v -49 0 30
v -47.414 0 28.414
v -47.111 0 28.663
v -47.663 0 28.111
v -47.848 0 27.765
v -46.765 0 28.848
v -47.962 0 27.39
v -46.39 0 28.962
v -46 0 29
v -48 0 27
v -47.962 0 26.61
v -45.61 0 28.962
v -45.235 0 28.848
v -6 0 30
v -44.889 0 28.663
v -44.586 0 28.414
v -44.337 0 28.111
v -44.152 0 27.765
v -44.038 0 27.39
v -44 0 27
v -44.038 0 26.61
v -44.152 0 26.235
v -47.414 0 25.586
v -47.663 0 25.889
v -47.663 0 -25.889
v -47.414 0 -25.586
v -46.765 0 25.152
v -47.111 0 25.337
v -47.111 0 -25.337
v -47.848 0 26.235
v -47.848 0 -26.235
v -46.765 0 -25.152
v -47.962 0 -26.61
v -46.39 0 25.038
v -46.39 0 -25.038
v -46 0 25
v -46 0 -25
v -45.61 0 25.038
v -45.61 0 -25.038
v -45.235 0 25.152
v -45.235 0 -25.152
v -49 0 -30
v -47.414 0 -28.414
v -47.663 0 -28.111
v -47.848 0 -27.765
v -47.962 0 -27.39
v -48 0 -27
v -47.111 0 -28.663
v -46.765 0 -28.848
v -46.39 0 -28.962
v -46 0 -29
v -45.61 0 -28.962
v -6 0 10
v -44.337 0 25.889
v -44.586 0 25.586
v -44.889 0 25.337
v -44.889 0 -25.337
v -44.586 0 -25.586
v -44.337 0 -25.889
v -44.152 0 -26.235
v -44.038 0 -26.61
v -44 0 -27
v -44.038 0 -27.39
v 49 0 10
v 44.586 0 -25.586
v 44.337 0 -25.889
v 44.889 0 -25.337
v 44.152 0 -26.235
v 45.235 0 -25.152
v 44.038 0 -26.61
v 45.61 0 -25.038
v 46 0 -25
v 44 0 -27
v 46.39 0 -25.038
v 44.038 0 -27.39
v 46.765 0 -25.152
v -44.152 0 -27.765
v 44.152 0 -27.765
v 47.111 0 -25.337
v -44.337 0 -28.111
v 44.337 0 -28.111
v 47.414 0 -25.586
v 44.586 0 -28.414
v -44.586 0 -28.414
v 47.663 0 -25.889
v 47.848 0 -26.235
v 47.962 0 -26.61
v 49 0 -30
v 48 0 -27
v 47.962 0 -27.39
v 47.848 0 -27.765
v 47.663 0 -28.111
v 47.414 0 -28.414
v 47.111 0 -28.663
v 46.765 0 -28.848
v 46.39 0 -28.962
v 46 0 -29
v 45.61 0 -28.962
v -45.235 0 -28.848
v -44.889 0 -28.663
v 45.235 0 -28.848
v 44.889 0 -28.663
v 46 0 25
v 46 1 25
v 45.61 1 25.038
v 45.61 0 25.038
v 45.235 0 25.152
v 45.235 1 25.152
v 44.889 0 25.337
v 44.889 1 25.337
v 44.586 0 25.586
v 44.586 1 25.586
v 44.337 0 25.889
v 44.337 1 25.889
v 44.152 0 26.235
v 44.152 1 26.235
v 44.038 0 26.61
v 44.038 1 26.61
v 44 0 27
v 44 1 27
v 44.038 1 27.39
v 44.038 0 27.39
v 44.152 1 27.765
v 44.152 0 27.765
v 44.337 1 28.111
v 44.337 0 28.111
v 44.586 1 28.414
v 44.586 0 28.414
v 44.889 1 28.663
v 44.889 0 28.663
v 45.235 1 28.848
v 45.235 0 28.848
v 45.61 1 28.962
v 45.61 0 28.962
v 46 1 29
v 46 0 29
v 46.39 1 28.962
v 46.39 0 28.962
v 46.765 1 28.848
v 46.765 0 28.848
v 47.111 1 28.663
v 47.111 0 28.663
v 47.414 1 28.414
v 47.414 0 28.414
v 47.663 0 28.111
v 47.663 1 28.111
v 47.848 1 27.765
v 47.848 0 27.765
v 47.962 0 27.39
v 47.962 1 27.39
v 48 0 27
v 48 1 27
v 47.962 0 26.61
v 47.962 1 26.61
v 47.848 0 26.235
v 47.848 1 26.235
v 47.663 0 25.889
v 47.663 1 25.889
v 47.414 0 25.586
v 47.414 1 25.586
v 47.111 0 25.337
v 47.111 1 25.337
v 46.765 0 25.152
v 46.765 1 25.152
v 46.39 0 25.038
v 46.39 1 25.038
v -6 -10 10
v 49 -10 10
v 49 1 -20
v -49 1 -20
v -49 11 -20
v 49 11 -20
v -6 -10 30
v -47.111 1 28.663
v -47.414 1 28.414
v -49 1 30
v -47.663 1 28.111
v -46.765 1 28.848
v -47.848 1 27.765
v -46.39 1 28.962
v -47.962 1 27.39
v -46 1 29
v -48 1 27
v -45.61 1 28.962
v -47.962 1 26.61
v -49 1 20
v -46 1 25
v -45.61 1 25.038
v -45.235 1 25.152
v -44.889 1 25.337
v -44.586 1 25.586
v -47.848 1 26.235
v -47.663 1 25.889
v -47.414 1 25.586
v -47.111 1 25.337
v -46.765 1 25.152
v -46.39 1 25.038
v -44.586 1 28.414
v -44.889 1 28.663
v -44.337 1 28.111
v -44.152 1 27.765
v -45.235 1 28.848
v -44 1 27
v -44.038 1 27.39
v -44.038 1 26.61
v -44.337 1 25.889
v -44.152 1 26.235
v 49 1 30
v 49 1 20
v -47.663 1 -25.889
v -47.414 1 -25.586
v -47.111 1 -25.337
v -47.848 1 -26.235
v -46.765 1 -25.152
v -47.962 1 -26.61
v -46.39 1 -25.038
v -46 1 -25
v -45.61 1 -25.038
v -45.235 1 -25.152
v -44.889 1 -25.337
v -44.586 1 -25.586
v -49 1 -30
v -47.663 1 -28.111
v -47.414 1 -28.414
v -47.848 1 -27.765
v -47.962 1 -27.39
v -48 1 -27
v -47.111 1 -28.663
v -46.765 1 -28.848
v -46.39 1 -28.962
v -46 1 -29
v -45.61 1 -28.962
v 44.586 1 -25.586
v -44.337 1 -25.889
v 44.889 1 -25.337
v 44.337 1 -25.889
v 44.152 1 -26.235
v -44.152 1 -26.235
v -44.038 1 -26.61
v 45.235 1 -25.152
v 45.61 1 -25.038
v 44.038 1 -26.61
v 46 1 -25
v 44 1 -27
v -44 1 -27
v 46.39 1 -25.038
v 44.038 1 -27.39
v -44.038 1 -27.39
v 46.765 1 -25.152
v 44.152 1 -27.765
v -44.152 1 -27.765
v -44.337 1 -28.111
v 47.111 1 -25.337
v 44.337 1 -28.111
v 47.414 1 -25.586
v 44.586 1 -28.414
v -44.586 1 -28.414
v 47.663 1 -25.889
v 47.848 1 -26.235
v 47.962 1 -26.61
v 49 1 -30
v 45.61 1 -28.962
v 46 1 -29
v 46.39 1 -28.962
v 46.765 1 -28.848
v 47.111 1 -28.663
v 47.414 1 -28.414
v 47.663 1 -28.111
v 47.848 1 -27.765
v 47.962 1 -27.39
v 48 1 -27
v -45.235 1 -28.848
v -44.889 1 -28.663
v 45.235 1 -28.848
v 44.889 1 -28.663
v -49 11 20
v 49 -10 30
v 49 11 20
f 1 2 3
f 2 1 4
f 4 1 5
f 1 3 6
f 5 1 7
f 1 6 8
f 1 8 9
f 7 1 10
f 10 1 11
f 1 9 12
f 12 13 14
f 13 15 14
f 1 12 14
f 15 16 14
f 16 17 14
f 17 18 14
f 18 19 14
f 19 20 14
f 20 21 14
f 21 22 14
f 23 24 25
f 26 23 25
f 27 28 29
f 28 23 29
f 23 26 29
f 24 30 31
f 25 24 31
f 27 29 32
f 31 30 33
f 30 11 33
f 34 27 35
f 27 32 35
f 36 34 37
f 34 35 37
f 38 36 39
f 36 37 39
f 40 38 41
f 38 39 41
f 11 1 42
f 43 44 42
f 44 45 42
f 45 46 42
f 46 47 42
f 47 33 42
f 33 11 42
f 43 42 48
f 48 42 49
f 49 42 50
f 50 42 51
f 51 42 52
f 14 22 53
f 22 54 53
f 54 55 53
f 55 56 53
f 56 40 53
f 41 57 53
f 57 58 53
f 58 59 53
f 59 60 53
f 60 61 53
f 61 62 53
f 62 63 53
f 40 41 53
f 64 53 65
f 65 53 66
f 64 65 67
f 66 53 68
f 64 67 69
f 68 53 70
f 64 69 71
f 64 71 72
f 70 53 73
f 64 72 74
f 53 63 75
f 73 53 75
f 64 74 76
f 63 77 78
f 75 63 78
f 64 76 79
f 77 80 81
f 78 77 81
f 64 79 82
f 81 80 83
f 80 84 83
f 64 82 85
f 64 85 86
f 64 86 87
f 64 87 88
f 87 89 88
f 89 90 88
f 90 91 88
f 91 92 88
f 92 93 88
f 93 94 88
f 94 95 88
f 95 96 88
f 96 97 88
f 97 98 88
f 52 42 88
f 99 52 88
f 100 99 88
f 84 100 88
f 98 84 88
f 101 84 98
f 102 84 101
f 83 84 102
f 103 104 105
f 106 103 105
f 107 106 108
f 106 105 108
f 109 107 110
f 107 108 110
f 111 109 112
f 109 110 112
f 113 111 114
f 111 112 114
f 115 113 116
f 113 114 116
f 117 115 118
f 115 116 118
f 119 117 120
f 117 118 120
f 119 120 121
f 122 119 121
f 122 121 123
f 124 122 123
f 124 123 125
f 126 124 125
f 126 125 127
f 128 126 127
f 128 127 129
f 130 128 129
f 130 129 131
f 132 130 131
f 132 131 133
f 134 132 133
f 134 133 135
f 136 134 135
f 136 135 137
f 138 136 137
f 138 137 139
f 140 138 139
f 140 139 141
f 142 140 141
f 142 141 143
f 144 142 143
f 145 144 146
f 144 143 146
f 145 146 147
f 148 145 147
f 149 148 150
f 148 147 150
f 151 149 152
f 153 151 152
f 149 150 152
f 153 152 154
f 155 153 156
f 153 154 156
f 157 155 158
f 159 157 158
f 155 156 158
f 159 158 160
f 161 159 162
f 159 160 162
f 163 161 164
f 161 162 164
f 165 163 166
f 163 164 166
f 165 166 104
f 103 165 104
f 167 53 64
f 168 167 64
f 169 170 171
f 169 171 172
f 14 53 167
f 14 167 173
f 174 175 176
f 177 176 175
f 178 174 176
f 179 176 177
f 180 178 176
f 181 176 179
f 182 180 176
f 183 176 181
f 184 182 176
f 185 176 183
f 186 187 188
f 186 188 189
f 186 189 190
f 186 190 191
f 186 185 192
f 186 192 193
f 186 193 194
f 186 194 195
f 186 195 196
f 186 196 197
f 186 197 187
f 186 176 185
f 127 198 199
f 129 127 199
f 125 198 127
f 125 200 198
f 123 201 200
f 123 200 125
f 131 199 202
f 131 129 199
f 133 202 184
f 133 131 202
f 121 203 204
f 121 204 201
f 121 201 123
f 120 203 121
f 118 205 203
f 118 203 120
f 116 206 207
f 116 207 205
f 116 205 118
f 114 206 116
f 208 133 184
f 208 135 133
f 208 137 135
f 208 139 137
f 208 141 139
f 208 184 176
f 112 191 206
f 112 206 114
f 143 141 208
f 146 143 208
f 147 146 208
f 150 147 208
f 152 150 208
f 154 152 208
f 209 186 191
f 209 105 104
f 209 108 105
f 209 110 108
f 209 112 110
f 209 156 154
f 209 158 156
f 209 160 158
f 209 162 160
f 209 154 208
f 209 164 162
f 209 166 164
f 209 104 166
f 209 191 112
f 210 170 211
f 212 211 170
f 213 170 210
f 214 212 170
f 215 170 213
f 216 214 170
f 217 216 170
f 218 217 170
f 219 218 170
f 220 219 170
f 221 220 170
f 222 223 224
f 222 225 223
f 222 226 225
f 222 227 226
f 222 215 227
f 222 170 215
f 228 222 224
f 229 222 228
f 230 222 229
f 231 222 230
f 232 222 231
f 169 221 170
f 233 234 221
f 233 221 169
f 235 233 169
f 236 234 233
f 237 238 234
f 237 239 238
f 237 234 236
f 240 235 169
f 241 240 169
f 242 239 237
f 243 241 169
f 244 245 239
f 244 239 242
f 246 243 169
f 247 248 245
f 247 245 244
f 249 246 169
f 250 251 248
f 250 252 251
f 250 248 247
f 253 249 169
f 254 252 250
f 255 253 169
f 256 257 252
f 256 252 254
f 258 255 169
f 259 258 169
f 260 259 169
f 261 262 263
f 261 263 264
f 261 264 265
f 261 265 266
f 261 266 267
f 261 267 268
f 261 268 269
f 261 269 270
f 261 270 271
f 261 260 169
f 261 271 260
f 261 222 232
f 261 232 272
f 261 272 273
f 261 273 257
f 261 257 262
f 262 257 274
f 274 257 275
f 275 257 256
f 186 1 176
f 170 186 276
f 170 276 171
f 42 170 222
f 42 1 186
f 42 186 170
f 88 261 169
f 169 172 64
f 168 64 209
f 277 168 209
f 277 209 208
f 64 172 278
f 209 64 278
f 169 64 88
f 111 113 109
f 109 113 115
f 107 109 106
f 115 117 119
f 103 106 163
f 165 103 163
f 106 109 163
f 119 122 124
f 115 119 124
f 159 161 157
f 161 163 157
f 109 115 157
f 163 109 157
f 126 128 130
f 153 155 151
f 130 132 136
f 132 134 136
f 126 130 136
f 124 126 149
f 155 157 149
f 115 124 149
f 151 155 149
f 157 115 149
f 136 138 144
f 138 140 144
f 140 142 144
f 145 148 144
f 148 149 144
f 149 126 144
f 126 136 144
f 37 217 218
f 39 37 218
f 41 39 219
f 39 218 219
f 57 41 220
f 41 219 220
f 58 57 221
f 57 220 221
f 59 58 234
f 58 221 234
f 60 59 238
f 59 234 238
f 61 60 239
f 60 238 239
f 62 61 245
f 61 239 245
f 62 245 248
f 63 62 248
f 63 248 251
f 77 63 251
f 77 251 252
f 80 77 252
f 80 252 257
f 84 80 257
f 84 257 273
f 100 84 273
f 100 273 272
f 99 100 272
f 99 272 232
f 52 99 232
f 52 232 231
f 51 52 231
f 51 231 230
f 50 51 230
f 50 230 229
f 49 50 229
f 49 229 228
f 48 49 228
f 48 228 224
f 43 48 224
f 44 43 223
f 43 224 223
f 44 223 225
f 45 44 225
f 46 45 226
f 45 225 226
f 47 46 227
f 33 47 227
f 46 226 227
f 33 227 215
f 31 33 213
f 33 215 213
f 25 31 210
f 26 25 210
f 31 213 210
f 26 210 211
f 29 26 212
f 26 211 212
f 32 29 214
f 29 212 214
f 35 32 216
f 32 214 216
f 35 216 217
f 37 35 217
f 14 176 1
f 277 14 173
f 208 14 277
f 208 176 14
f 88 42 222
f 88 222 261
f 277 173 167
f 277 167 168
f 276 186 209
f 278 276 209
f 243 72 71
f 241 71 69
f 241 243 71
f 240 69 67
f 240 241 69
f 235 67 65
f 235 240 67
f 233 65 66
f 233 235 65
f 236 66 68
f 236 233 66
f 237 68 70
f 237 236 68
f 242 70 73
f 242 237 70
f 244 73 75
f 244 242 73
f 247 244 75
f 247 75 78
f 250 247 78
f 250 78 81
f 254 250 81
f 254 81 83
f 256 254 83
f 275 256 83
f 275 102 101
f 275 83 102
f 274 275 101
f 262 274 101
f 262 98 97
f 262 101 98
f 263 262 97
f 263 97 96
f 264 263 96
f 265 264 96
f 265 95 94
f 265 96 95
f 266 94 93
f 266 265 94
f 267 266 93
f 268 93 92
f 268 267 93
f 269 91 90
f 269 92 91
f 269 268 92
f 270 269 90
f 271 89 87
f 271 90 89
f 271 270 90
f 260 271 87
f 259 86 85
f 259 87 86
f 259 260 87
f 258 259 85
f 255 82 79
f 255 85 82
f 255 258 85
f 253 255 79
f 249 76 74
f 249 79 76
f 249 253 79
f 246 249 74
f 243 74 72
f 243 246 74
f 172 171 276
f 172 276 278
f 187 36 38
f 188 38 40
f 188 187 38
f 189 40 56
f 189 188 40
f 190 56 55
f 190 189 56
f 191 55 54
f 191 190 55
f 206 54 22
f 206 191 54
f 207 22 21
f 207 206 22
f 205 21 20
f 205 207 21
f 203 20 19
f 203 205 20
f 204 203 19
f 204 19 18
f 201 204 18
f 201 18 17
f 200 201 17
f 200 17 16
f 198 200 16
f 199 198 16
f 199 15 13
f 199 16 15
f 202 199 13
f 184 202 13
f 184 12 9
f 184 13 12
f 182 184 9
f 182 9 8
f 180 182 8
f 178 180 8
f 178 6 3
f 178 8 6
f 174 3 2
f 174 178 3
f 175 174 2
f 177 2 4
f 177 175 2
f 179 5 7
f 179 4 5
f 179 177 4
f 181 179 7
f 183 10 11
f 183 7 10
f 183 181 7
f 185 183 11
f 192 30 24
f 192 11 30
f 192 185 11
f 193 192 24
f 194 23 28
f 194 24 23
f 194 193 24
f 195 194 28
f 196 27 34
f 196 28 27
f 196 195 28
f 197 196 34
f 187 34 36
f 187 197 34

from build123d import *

# Parameters (mm, degrees)
SKETCH2_W               = 98
SKETCH2_H               = 60
BOSS_EXTRUDE1_DEPTH     = 1
SKETCH3_W               = 98
SKETCH3_H               = 40
BOSS_EXTRUDE2_DEPTH     = 10
SKETCH4_R               = 2
CUT_EXTRUDE1_DEPTH      = 10
MIRROR2_COPY_1_SKETCH_R = 2
MIRROR2_COPY_1_DEPTH    = 10
SKETCH5_W               = 55
SKETCH5_H               = 20
BOSS_EXTRUDE3_DEPTH     = 10


with BuildPart() as part:
    # Sketch2 → Boss-Extrude1 (new body)
    with BuildSketch(Plane(origin=(0, 0, 0), x_dir=(1, 0, 0), z_dir=(0, 1, 0))):
        Rectangle(SKETCH2_W, SKETCH2_H)
    extrude(amount=BOSS_EXTRUDE1_DEPTH)

    # Sketch3 → Boss-Extrude2 (add)
    with BuildSketch(Plane(origin=(0, 1, 0), x_dir=(1, 0, 0), z_dir=(0, 1, 0))):
        Rectangle(SKETCH3_W, SKETCH3_H)
    extrude(amount=BOSS_EXTRUDE2_DEPTH)

    # Sketch4 → Cut-Extrude1 (cut)
    with BuildSketch(Plane(origin=(0, 1, 0), x_dir=(1, 0, 0), z_dir=(0, 1, 0))):
        with Locations(Location((-46, 27, 0), (0, 0, 270))):
            Circle(SKETCH4_R)
    cut_extrude1 = extrude(amount=-CUT_EXTRUDE1_DEPTH, mode=Mode.SUBTRACT)

    # Mirror1: Cut-Extrude1 across plane
    add(cut_extrude1.mirror(Plane.XY), mode=Mode.SUBTRACT)

    # Mirror2: Cut-Extrude1 across plane
    add(cut_extrude1.mirror(Plane(origin=(0, 0, 0), x_dir=(0, 0, 1), z_dir=(1, 0, 0))), mode=Mode.SUBTRACT)

    # Mirror2 copy 1 sketch → Mirror2 copy 1 (cut)
    with BuildSketch(Plane(origin=(0, 1, 0), x_dir=(-1, 0, 0), z_dir=(0, 1, 0))):
        with Locations(Location((-46, 27, 0), (0, 0, 270))):
            Circle(MIRROR2_COPY_1_SKETCH_R)
    extrude(amount=-MIRROR2_COPY_1_DEPTH, mode=Mode.SUBTRACT)

    # Sketch5 → Boss-Extrude3 (add)
    with BuildSketch(Plane.XZ):
        with Locations((21.5, 20)):
            Rectangle(SKETCH5_W, SKETCH5_H)
    extrude(amount=BOSS_EXTRUDE3_DEPTH)


solid = part.part
